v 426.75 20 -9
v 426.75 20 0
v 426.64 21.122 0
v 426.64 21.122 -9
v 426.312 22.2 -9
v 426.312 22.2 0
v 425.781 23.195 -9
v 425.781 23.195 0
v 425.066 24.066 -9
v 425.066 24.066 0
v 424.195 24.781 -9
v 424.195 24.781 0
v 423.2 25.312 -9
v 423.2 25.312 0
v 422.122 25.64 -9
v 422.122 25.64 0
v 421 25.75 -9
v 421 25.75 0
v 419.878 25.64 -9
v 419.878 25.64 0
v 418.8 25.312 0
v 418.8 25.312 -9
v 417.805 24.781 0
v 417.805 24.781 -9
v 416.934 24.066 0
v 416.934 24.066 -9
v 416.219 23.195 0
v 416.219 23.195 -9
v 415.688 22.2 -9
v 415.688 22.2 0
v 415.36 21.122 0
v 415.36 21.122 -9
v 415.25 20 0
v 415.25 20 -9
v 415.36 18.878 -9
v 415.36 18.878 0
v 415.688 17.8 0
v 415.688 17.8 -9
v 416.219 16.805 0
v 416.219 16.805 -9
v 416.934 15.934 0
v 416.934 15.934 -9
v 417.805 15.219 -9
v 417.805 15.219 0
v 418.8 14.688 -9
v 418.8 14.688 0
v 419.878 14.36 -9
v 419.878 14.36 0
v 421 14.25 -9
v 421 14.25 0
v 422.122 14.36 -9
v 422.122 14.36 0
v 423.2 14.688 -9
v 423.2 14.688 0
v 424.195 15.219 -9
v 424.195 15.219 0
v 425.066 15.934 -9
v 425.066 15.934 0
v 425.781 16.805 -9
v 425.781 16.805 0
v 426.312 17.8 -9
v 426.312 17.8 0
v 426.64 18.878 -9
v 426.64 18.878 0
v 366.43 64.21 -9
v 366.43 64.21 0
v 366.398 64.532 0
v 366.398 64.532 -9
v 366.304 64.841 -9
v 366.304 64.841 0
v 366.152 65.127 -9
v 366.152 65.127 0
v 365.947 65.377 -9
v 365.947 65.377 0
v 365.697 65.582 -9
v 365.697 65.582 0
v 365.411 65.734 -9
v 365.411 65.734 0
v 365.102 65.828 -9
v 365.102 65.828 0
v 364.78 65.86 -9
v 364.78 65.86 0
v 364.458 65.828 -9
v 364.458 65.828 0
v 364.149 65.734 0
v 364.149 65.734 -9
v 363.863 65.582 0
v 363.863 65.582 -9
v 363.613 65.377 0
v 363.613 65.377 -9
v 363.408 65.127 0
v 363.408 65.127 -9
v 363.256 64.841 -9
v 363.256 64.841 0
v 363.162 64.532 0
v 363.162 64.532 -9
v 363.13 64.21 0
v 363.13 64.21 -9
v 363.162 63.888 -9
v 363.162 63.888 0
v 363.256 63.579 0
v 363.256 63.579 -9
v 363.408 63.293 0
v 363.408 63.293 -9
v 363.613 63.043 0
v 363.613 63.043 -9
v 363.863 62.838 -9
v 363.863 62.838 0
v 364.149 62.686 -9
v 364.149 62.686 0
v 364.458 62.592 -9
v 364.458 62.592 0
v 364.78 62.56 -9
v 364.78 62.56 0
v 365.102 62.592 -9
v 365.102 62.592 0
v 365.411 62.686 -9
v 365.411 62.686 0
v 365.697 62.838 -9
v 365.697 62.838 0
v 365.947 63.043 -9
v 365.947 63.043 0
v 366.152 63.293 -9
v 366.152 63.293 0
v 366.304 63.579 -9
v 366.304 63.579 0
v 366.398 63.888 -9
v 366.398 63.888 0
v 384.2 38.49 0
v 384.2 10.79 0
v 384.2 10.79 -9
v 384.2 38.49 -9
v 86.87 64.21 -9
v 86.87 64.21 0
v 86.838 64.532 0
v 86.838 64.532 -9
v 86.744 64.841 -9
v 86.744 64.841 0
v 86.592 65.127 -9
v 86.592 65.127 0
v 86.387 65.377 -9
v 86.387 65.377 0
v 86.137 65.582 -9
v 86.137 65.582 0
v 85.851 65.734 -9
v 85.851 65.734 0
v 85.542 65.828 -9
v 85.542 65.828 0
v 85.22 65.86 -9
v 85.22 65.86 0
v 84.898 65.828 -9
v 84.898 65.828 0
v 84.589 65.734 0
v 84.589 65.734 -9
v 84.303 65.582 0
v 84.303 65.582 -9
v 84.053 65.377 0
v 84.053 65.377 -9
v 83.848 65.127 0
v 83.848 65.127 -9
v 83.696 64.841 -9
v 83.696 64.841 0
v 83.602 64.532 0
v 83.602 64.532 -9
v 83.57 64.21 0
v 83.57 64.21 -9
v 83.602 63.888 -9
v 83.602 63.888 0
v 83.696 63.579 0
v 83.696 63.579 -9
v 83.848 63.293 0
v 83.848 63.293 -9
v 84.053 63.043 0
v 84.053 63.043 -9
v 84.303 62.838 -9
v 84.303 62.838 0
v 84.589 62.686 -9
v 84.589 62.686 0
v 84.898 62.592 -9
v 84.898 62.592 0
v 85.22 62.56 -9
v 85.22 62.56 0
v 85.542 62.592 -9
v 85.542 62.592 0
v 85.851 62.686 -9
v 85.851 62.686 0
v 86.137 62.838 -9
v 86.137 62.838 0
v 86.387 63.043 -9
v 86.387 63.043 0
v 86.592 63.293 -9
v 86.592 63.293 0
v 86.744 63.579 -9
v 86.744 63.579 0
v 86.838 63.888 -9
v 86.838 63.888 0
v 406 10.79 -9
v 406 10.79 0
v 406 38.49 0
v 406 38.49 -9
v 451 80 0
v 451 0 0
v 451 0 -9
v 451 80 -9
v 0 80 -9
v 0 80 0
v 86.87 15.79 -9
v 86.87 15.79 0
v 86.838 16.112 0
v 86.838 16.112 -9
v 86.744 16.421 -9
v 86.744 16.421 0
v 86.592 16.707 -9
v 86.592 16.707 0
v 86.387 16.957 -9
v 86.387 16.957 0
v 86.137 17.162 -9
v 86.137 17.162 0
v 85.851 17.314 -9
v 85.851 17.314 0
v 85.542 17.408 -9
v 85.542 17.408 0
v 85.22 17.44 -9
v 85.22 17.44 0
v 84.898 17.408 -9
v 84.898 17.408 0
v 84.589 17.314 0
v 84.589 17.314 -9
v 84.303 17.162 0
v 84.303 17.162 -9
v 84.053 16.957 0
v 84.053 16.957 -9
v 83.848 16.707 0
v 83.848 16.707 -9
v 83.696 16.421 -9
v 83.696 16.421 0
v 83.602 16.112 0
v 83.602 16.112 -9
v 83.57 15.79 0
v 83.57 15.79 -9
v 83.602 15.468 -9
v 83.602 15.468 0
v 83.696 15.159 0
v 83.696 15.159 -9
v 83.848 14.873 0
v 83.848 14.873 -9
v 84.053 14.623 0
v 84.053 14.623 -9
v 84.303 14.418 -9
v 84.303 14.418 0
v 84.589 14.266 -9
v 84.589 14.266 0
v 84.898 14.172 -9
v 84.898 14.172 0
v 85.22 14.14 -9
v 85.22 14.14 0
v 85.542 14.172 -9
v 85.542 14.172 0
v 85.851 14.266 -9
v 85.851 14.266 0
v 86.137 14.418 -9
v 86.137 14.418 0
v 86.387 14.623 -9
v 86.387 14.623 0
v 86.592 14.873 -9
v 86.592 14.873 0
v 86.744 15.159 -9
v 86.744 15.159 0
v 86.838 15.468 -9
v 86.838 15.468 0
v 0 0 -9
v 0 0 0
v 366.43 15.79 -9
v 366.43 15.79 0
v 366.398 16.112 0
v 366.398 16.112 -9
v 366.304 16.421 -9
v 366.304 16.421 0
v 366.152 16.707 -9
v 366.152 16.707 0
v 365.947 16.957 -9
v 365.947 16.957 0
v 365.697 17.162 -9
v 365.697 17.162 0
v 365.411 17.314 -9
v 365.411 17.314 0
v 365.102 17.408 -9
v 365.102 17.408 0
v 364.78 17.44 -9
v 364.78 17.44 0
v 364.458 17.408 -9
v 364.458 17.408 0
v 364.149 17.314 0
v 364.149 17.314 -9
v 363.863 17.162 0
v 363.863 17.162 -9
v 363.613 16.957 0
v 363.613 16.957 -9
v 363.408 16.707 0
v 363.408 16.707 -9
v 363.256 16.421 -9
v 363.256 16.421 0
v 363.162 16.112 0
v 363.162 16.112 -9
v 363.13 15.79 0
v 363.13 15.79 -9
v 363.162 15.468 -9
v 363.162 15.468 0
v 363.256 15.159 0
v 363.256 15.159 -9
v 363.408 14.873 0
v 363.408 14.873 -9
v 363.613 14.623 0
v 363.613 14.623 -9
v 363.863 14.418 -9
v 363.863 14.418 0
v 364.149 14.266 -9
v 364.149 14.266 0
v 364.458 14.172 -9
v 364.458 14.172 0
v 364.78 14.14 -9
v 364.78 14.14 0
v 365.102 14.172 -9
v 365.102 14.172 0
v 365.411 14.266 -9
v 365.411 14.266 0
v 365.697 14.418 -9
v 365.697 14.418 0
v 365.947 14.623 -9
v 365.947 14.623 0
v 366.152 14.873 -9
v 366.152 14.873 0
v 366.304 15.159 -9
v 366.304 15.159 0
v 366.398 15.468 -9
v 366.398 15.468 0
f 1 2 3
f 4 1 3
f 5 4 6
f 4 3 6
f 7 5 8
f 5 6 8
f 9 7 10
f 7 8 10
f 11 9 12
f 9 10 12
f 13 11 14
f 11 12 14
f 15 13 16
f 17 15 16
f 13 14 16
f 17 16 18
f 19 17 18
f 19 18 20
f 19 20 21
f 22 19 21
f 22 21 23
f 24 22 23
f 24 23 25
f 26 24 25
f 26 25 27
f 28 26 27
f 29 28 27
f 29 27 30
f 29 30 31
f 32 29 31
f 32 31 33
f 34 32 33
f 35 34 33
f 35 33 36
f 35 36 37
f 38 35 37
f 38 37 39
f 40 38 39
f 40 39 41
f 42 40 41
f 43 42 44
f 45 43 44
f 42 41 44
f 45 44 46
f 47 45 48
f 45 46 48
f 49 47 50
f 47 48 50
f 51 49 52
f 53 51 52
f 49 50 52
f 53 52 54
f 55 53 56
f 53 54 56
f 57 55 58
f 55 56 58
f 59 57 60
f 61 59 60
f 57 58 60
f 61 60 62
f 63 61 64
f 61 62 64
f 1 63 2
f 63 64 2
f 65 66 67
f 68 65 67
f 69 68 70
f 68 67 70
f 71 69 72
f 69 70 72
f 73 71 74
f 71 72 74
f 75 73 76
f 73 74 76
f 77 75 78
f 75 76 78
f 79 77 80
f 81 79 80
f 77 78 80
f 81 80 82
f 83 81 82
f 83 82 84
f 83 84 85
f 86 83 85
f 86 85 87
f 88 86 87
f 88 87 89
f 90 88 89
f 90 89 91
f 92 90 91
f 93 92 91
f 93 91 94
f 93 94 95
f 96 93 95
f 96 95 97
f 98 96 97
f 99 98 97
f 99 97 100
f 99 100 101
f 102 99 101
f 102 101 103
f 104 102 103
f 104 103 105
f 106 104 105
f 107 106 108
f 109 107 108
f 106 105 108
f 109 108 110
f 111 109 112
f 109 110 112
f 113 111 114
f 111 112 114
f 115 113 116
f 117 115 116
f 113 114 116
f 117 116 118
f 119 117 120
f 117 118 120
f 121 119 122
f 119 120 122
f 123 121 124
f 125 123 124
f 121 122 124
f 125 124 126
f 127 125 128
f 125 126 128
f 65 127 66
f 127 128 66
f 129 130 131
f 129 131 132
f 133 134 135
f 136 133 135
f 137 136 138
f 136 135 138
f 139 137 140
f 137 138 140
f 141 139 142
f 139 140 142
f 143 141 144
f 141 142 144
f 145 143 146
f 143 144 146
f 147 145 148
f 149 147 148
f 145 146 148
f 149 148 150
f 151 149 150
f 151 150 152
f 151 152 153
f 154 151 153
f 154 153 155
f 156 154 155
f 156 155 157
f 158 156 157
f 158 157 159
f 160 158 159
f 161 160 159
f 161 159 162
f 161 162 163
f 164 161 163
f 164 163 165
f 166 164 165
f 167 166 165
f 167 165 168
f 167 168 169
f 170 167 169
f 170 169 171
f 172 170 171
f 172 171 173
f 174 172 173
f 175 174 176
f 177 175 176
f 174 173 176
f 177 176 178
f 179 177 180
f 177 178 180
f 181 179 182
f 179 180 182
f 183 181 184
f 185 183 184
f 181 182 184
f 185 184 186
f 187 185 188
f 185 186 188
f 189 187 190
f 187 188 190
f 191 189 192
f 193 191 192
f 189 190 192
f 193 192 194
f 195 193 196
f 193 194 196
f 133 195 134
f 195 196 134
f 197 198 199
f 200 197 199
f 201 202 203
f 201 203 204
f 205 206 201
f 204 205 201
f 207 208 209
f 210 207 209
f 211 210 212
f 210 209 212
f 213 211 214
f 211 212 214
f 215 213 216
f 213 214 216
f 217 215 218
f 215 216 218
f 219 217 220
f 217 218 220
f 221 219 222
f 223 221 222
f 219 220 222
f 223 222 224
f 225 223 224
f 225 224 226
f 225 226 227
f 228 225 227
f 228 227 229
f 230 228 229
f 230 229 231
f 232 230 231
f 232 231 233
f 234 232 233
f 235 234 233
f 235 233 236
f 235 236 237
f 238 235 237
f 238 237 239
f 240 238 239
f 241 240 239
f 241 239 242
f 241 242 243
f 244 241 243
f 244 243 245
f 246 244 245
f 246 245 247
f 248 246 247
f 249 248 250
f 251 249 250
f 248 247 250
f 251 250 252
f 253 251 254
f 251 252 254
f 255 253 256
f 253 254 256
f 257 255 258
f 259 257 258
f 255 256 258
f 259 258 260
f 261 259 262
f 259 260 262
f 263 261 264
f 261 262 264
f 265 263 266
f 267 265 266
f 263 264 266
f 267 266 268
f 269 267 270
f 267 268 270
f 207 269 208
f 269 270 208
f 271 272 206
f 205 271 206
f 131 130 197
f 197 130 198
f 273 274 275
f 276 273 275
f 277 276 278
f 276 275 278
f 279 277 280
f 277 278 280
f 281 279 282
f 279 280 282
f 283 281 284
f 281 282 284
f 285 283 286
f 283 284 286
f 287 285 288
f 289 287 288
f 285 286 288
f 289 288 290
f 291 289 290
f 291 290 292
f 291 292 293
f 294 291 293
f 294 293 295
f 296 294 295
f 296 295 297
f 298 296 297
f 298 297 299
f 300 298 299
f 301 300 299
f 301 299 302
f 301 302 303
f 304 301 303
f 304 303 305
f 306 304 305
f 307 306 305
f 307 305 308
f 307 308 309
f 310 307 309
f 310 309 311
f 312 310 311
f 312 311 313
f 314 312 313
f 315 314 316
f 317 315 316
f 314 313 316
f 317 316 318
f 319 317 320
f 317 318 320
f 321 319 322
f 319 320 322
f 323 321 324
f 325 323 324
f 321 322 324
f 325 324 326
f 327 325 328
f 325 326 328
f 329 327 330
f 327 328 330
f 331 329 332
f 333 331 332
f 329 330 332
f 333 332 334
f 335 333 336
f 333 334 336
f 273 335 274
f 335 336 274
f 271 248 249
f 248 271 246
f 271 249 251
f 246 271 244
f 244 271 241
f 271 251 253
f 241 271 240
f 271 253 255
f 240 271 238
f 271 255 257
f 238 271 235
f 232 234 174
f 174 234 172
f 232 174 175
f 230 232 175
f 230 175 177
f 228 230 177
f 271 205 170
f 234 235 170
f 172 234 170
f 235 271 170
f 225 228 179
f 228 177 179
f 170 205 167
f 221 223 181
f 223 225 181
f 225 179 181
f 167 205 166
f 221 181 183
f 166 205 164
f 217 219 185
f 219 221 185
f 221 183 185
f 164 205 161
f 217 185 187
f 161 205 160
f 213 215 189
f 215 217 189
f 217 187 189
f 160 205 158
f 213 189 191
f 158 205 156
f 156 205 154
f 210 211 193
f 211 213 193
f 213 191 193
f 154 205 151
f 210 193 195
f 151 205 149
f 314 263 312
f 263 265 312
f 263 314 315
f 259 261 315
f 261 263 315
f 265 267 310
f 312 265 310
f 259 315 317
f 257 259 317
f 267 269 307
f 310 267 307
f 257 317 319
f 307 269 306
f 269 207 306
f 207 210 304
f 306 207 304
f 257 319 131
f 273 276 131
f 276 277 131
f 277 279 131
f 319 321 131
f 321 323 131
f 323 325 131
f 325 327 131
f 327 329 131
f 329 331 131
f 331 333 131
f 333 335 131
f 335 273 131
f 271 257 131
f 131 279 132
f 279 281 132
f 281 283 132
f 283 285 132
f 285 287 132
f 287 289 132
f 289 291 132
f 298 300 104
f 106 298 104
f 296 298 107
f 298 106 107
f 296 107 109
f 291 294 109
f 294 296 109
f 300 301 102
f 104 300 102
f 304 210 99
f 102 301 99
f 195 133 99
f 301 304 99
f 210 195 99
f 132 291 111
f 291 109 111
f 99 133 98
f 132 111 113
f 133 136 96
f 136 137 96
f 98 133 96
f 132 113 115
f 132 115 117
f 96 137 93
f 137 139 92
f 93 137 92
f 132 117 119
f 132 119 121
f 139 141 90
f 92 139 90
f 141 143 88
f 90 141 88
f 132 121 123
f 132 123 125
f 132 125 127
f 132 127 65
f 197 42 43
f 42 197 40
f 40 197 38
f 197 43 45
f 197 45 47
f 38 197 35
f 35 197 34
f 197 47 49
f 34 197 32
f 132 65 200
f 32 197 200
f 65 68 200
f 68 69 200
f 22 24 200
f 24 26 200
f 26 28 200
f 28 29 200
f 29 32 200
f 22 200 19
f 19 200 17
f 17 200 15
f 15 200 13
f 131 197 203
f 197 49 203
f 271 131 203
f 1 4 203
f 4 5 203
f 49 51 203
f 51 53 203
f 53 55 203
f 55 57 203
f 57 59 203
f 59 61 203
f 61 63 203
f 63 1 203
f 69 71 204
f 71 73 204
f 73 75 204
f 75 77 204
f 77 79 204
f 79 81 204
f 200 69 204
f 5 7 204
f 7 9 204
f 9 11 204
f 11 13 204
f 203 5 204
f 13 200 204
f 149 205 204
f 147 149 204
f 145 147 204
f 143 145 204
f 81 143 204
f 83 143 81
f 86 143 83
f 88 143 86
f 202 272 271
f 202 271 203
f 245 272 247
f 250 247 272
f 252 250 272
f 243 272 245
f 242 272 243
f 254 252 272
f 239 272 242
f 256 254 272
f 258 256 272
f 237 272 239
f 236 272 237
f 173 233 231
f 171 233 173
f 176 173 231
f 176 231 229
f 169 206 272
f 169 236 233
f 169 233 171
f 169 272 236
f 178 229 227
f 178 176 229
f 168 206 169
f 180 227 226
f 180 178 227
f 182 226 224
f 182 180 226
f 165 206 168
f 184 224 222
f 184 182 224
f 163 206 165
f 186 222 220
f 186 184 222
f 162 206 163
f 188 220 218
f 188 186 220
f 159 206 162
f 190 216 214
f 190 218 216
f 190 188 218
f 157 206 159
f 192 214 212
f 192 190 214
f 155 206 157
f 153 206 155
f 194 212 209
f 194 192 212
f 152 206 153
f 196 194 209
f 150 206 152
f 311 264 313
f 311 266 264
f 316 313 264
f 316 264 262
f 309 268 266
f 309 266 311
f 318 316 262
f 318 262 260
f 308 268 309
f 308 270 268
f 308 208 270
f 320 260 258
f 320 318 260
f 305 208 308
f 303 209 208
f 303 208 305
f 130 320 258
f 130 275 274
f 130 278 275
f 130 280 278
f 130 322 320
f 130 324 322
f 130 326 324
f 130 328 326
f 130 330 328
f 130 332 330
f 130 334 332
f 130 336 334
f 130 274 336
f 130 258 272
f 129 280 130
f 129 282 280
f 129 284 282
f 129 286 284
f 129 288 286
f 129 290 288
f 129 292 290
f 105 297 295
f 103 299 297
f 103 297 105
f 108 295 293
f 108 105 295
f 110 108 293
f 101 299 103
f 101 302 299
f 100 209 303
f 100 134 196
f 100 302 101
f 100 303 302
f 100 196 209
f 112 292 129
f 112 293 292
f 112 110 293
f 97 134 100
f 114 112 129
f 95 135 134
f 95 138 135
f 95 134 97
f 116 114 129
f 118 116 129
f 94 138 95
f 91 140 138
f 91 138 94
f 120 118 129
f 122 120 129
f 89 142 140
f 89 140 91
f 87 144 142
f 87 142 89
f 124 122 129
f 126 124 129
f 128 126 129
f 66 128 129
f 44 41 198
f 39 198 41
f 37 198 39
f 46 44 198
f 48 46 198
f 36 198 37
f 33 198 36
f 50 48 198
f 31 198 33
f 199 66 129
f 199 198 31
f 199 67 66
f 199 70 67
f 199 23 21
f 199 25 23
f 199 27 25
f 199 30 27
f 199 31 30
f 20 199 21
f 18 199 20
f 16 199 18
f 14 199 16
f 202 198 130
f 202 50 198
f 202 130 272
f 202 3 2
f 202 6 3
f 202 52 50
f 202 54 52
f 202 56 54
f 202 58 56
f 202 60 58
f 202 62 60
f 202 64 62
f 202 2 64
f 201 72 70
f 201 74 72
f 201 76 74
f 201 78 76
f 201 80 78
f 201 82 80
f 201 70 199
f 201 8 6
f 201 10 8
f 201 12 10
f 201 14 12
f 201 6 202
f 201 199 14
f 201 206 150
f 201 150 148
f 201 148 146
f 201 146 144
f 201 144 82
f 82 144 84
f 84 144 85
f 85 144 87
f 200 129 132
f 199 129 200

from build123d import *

# Parameters (mm, degrees)
SZKIC1_W                    = 451
SZKIC1_H                    = 80
DODANIE_WYCI_GNI_CIE1_DEPTH = 9
SZKIC2_W                    = 21.8
SZKIC2_H                    = 27.7
SZKIC2_R                    = 5.75
SZKIC2_R_2                  = 1.65
WYTNIJ_WYCI_GNI_CIE1_DEPTH  = 10


with BuildPart() as part:
    # Szkic1 → Dodanie-wyciągnięcie1 (new body)
    with BuildSketch(Plane.XY):
        with Locations((225.5, 40)):
            Rectangle(SZKIC1_W, SZKIC1_H)
    extrude(amount=-DODANIE_WYCI_GNI_CIE1_DEPTH)

    # Szkic2 → Wytnij-wyciągnięcie1 (cut)
    with BuildSketch(Plane.XY):
        with Locations((395.1, 24.64)):
            Rectangle(SZKIC2_W, SZKIC2_H)
        with Locations((421, 20)):
            Circle(SZKIC2_R)
        with Locations((364.78, 64.21)):
            Circle(SZKIC2_R_2)
        with Locations((364.78, 15.79)):
            Circle(SZKIC2_R_2)
        with Locations((85.22, 64.21)):
            Circle(SZKIC2_R_2)
        with Locations((85.22, 15.79)):
            Circle(SZKIC2_R_2)
    extrude(amount=-WYTNIJ_WYCI_GNI_CIE1_DEPTH, mode=Mode.SUBTRACT)


solid = part.part
